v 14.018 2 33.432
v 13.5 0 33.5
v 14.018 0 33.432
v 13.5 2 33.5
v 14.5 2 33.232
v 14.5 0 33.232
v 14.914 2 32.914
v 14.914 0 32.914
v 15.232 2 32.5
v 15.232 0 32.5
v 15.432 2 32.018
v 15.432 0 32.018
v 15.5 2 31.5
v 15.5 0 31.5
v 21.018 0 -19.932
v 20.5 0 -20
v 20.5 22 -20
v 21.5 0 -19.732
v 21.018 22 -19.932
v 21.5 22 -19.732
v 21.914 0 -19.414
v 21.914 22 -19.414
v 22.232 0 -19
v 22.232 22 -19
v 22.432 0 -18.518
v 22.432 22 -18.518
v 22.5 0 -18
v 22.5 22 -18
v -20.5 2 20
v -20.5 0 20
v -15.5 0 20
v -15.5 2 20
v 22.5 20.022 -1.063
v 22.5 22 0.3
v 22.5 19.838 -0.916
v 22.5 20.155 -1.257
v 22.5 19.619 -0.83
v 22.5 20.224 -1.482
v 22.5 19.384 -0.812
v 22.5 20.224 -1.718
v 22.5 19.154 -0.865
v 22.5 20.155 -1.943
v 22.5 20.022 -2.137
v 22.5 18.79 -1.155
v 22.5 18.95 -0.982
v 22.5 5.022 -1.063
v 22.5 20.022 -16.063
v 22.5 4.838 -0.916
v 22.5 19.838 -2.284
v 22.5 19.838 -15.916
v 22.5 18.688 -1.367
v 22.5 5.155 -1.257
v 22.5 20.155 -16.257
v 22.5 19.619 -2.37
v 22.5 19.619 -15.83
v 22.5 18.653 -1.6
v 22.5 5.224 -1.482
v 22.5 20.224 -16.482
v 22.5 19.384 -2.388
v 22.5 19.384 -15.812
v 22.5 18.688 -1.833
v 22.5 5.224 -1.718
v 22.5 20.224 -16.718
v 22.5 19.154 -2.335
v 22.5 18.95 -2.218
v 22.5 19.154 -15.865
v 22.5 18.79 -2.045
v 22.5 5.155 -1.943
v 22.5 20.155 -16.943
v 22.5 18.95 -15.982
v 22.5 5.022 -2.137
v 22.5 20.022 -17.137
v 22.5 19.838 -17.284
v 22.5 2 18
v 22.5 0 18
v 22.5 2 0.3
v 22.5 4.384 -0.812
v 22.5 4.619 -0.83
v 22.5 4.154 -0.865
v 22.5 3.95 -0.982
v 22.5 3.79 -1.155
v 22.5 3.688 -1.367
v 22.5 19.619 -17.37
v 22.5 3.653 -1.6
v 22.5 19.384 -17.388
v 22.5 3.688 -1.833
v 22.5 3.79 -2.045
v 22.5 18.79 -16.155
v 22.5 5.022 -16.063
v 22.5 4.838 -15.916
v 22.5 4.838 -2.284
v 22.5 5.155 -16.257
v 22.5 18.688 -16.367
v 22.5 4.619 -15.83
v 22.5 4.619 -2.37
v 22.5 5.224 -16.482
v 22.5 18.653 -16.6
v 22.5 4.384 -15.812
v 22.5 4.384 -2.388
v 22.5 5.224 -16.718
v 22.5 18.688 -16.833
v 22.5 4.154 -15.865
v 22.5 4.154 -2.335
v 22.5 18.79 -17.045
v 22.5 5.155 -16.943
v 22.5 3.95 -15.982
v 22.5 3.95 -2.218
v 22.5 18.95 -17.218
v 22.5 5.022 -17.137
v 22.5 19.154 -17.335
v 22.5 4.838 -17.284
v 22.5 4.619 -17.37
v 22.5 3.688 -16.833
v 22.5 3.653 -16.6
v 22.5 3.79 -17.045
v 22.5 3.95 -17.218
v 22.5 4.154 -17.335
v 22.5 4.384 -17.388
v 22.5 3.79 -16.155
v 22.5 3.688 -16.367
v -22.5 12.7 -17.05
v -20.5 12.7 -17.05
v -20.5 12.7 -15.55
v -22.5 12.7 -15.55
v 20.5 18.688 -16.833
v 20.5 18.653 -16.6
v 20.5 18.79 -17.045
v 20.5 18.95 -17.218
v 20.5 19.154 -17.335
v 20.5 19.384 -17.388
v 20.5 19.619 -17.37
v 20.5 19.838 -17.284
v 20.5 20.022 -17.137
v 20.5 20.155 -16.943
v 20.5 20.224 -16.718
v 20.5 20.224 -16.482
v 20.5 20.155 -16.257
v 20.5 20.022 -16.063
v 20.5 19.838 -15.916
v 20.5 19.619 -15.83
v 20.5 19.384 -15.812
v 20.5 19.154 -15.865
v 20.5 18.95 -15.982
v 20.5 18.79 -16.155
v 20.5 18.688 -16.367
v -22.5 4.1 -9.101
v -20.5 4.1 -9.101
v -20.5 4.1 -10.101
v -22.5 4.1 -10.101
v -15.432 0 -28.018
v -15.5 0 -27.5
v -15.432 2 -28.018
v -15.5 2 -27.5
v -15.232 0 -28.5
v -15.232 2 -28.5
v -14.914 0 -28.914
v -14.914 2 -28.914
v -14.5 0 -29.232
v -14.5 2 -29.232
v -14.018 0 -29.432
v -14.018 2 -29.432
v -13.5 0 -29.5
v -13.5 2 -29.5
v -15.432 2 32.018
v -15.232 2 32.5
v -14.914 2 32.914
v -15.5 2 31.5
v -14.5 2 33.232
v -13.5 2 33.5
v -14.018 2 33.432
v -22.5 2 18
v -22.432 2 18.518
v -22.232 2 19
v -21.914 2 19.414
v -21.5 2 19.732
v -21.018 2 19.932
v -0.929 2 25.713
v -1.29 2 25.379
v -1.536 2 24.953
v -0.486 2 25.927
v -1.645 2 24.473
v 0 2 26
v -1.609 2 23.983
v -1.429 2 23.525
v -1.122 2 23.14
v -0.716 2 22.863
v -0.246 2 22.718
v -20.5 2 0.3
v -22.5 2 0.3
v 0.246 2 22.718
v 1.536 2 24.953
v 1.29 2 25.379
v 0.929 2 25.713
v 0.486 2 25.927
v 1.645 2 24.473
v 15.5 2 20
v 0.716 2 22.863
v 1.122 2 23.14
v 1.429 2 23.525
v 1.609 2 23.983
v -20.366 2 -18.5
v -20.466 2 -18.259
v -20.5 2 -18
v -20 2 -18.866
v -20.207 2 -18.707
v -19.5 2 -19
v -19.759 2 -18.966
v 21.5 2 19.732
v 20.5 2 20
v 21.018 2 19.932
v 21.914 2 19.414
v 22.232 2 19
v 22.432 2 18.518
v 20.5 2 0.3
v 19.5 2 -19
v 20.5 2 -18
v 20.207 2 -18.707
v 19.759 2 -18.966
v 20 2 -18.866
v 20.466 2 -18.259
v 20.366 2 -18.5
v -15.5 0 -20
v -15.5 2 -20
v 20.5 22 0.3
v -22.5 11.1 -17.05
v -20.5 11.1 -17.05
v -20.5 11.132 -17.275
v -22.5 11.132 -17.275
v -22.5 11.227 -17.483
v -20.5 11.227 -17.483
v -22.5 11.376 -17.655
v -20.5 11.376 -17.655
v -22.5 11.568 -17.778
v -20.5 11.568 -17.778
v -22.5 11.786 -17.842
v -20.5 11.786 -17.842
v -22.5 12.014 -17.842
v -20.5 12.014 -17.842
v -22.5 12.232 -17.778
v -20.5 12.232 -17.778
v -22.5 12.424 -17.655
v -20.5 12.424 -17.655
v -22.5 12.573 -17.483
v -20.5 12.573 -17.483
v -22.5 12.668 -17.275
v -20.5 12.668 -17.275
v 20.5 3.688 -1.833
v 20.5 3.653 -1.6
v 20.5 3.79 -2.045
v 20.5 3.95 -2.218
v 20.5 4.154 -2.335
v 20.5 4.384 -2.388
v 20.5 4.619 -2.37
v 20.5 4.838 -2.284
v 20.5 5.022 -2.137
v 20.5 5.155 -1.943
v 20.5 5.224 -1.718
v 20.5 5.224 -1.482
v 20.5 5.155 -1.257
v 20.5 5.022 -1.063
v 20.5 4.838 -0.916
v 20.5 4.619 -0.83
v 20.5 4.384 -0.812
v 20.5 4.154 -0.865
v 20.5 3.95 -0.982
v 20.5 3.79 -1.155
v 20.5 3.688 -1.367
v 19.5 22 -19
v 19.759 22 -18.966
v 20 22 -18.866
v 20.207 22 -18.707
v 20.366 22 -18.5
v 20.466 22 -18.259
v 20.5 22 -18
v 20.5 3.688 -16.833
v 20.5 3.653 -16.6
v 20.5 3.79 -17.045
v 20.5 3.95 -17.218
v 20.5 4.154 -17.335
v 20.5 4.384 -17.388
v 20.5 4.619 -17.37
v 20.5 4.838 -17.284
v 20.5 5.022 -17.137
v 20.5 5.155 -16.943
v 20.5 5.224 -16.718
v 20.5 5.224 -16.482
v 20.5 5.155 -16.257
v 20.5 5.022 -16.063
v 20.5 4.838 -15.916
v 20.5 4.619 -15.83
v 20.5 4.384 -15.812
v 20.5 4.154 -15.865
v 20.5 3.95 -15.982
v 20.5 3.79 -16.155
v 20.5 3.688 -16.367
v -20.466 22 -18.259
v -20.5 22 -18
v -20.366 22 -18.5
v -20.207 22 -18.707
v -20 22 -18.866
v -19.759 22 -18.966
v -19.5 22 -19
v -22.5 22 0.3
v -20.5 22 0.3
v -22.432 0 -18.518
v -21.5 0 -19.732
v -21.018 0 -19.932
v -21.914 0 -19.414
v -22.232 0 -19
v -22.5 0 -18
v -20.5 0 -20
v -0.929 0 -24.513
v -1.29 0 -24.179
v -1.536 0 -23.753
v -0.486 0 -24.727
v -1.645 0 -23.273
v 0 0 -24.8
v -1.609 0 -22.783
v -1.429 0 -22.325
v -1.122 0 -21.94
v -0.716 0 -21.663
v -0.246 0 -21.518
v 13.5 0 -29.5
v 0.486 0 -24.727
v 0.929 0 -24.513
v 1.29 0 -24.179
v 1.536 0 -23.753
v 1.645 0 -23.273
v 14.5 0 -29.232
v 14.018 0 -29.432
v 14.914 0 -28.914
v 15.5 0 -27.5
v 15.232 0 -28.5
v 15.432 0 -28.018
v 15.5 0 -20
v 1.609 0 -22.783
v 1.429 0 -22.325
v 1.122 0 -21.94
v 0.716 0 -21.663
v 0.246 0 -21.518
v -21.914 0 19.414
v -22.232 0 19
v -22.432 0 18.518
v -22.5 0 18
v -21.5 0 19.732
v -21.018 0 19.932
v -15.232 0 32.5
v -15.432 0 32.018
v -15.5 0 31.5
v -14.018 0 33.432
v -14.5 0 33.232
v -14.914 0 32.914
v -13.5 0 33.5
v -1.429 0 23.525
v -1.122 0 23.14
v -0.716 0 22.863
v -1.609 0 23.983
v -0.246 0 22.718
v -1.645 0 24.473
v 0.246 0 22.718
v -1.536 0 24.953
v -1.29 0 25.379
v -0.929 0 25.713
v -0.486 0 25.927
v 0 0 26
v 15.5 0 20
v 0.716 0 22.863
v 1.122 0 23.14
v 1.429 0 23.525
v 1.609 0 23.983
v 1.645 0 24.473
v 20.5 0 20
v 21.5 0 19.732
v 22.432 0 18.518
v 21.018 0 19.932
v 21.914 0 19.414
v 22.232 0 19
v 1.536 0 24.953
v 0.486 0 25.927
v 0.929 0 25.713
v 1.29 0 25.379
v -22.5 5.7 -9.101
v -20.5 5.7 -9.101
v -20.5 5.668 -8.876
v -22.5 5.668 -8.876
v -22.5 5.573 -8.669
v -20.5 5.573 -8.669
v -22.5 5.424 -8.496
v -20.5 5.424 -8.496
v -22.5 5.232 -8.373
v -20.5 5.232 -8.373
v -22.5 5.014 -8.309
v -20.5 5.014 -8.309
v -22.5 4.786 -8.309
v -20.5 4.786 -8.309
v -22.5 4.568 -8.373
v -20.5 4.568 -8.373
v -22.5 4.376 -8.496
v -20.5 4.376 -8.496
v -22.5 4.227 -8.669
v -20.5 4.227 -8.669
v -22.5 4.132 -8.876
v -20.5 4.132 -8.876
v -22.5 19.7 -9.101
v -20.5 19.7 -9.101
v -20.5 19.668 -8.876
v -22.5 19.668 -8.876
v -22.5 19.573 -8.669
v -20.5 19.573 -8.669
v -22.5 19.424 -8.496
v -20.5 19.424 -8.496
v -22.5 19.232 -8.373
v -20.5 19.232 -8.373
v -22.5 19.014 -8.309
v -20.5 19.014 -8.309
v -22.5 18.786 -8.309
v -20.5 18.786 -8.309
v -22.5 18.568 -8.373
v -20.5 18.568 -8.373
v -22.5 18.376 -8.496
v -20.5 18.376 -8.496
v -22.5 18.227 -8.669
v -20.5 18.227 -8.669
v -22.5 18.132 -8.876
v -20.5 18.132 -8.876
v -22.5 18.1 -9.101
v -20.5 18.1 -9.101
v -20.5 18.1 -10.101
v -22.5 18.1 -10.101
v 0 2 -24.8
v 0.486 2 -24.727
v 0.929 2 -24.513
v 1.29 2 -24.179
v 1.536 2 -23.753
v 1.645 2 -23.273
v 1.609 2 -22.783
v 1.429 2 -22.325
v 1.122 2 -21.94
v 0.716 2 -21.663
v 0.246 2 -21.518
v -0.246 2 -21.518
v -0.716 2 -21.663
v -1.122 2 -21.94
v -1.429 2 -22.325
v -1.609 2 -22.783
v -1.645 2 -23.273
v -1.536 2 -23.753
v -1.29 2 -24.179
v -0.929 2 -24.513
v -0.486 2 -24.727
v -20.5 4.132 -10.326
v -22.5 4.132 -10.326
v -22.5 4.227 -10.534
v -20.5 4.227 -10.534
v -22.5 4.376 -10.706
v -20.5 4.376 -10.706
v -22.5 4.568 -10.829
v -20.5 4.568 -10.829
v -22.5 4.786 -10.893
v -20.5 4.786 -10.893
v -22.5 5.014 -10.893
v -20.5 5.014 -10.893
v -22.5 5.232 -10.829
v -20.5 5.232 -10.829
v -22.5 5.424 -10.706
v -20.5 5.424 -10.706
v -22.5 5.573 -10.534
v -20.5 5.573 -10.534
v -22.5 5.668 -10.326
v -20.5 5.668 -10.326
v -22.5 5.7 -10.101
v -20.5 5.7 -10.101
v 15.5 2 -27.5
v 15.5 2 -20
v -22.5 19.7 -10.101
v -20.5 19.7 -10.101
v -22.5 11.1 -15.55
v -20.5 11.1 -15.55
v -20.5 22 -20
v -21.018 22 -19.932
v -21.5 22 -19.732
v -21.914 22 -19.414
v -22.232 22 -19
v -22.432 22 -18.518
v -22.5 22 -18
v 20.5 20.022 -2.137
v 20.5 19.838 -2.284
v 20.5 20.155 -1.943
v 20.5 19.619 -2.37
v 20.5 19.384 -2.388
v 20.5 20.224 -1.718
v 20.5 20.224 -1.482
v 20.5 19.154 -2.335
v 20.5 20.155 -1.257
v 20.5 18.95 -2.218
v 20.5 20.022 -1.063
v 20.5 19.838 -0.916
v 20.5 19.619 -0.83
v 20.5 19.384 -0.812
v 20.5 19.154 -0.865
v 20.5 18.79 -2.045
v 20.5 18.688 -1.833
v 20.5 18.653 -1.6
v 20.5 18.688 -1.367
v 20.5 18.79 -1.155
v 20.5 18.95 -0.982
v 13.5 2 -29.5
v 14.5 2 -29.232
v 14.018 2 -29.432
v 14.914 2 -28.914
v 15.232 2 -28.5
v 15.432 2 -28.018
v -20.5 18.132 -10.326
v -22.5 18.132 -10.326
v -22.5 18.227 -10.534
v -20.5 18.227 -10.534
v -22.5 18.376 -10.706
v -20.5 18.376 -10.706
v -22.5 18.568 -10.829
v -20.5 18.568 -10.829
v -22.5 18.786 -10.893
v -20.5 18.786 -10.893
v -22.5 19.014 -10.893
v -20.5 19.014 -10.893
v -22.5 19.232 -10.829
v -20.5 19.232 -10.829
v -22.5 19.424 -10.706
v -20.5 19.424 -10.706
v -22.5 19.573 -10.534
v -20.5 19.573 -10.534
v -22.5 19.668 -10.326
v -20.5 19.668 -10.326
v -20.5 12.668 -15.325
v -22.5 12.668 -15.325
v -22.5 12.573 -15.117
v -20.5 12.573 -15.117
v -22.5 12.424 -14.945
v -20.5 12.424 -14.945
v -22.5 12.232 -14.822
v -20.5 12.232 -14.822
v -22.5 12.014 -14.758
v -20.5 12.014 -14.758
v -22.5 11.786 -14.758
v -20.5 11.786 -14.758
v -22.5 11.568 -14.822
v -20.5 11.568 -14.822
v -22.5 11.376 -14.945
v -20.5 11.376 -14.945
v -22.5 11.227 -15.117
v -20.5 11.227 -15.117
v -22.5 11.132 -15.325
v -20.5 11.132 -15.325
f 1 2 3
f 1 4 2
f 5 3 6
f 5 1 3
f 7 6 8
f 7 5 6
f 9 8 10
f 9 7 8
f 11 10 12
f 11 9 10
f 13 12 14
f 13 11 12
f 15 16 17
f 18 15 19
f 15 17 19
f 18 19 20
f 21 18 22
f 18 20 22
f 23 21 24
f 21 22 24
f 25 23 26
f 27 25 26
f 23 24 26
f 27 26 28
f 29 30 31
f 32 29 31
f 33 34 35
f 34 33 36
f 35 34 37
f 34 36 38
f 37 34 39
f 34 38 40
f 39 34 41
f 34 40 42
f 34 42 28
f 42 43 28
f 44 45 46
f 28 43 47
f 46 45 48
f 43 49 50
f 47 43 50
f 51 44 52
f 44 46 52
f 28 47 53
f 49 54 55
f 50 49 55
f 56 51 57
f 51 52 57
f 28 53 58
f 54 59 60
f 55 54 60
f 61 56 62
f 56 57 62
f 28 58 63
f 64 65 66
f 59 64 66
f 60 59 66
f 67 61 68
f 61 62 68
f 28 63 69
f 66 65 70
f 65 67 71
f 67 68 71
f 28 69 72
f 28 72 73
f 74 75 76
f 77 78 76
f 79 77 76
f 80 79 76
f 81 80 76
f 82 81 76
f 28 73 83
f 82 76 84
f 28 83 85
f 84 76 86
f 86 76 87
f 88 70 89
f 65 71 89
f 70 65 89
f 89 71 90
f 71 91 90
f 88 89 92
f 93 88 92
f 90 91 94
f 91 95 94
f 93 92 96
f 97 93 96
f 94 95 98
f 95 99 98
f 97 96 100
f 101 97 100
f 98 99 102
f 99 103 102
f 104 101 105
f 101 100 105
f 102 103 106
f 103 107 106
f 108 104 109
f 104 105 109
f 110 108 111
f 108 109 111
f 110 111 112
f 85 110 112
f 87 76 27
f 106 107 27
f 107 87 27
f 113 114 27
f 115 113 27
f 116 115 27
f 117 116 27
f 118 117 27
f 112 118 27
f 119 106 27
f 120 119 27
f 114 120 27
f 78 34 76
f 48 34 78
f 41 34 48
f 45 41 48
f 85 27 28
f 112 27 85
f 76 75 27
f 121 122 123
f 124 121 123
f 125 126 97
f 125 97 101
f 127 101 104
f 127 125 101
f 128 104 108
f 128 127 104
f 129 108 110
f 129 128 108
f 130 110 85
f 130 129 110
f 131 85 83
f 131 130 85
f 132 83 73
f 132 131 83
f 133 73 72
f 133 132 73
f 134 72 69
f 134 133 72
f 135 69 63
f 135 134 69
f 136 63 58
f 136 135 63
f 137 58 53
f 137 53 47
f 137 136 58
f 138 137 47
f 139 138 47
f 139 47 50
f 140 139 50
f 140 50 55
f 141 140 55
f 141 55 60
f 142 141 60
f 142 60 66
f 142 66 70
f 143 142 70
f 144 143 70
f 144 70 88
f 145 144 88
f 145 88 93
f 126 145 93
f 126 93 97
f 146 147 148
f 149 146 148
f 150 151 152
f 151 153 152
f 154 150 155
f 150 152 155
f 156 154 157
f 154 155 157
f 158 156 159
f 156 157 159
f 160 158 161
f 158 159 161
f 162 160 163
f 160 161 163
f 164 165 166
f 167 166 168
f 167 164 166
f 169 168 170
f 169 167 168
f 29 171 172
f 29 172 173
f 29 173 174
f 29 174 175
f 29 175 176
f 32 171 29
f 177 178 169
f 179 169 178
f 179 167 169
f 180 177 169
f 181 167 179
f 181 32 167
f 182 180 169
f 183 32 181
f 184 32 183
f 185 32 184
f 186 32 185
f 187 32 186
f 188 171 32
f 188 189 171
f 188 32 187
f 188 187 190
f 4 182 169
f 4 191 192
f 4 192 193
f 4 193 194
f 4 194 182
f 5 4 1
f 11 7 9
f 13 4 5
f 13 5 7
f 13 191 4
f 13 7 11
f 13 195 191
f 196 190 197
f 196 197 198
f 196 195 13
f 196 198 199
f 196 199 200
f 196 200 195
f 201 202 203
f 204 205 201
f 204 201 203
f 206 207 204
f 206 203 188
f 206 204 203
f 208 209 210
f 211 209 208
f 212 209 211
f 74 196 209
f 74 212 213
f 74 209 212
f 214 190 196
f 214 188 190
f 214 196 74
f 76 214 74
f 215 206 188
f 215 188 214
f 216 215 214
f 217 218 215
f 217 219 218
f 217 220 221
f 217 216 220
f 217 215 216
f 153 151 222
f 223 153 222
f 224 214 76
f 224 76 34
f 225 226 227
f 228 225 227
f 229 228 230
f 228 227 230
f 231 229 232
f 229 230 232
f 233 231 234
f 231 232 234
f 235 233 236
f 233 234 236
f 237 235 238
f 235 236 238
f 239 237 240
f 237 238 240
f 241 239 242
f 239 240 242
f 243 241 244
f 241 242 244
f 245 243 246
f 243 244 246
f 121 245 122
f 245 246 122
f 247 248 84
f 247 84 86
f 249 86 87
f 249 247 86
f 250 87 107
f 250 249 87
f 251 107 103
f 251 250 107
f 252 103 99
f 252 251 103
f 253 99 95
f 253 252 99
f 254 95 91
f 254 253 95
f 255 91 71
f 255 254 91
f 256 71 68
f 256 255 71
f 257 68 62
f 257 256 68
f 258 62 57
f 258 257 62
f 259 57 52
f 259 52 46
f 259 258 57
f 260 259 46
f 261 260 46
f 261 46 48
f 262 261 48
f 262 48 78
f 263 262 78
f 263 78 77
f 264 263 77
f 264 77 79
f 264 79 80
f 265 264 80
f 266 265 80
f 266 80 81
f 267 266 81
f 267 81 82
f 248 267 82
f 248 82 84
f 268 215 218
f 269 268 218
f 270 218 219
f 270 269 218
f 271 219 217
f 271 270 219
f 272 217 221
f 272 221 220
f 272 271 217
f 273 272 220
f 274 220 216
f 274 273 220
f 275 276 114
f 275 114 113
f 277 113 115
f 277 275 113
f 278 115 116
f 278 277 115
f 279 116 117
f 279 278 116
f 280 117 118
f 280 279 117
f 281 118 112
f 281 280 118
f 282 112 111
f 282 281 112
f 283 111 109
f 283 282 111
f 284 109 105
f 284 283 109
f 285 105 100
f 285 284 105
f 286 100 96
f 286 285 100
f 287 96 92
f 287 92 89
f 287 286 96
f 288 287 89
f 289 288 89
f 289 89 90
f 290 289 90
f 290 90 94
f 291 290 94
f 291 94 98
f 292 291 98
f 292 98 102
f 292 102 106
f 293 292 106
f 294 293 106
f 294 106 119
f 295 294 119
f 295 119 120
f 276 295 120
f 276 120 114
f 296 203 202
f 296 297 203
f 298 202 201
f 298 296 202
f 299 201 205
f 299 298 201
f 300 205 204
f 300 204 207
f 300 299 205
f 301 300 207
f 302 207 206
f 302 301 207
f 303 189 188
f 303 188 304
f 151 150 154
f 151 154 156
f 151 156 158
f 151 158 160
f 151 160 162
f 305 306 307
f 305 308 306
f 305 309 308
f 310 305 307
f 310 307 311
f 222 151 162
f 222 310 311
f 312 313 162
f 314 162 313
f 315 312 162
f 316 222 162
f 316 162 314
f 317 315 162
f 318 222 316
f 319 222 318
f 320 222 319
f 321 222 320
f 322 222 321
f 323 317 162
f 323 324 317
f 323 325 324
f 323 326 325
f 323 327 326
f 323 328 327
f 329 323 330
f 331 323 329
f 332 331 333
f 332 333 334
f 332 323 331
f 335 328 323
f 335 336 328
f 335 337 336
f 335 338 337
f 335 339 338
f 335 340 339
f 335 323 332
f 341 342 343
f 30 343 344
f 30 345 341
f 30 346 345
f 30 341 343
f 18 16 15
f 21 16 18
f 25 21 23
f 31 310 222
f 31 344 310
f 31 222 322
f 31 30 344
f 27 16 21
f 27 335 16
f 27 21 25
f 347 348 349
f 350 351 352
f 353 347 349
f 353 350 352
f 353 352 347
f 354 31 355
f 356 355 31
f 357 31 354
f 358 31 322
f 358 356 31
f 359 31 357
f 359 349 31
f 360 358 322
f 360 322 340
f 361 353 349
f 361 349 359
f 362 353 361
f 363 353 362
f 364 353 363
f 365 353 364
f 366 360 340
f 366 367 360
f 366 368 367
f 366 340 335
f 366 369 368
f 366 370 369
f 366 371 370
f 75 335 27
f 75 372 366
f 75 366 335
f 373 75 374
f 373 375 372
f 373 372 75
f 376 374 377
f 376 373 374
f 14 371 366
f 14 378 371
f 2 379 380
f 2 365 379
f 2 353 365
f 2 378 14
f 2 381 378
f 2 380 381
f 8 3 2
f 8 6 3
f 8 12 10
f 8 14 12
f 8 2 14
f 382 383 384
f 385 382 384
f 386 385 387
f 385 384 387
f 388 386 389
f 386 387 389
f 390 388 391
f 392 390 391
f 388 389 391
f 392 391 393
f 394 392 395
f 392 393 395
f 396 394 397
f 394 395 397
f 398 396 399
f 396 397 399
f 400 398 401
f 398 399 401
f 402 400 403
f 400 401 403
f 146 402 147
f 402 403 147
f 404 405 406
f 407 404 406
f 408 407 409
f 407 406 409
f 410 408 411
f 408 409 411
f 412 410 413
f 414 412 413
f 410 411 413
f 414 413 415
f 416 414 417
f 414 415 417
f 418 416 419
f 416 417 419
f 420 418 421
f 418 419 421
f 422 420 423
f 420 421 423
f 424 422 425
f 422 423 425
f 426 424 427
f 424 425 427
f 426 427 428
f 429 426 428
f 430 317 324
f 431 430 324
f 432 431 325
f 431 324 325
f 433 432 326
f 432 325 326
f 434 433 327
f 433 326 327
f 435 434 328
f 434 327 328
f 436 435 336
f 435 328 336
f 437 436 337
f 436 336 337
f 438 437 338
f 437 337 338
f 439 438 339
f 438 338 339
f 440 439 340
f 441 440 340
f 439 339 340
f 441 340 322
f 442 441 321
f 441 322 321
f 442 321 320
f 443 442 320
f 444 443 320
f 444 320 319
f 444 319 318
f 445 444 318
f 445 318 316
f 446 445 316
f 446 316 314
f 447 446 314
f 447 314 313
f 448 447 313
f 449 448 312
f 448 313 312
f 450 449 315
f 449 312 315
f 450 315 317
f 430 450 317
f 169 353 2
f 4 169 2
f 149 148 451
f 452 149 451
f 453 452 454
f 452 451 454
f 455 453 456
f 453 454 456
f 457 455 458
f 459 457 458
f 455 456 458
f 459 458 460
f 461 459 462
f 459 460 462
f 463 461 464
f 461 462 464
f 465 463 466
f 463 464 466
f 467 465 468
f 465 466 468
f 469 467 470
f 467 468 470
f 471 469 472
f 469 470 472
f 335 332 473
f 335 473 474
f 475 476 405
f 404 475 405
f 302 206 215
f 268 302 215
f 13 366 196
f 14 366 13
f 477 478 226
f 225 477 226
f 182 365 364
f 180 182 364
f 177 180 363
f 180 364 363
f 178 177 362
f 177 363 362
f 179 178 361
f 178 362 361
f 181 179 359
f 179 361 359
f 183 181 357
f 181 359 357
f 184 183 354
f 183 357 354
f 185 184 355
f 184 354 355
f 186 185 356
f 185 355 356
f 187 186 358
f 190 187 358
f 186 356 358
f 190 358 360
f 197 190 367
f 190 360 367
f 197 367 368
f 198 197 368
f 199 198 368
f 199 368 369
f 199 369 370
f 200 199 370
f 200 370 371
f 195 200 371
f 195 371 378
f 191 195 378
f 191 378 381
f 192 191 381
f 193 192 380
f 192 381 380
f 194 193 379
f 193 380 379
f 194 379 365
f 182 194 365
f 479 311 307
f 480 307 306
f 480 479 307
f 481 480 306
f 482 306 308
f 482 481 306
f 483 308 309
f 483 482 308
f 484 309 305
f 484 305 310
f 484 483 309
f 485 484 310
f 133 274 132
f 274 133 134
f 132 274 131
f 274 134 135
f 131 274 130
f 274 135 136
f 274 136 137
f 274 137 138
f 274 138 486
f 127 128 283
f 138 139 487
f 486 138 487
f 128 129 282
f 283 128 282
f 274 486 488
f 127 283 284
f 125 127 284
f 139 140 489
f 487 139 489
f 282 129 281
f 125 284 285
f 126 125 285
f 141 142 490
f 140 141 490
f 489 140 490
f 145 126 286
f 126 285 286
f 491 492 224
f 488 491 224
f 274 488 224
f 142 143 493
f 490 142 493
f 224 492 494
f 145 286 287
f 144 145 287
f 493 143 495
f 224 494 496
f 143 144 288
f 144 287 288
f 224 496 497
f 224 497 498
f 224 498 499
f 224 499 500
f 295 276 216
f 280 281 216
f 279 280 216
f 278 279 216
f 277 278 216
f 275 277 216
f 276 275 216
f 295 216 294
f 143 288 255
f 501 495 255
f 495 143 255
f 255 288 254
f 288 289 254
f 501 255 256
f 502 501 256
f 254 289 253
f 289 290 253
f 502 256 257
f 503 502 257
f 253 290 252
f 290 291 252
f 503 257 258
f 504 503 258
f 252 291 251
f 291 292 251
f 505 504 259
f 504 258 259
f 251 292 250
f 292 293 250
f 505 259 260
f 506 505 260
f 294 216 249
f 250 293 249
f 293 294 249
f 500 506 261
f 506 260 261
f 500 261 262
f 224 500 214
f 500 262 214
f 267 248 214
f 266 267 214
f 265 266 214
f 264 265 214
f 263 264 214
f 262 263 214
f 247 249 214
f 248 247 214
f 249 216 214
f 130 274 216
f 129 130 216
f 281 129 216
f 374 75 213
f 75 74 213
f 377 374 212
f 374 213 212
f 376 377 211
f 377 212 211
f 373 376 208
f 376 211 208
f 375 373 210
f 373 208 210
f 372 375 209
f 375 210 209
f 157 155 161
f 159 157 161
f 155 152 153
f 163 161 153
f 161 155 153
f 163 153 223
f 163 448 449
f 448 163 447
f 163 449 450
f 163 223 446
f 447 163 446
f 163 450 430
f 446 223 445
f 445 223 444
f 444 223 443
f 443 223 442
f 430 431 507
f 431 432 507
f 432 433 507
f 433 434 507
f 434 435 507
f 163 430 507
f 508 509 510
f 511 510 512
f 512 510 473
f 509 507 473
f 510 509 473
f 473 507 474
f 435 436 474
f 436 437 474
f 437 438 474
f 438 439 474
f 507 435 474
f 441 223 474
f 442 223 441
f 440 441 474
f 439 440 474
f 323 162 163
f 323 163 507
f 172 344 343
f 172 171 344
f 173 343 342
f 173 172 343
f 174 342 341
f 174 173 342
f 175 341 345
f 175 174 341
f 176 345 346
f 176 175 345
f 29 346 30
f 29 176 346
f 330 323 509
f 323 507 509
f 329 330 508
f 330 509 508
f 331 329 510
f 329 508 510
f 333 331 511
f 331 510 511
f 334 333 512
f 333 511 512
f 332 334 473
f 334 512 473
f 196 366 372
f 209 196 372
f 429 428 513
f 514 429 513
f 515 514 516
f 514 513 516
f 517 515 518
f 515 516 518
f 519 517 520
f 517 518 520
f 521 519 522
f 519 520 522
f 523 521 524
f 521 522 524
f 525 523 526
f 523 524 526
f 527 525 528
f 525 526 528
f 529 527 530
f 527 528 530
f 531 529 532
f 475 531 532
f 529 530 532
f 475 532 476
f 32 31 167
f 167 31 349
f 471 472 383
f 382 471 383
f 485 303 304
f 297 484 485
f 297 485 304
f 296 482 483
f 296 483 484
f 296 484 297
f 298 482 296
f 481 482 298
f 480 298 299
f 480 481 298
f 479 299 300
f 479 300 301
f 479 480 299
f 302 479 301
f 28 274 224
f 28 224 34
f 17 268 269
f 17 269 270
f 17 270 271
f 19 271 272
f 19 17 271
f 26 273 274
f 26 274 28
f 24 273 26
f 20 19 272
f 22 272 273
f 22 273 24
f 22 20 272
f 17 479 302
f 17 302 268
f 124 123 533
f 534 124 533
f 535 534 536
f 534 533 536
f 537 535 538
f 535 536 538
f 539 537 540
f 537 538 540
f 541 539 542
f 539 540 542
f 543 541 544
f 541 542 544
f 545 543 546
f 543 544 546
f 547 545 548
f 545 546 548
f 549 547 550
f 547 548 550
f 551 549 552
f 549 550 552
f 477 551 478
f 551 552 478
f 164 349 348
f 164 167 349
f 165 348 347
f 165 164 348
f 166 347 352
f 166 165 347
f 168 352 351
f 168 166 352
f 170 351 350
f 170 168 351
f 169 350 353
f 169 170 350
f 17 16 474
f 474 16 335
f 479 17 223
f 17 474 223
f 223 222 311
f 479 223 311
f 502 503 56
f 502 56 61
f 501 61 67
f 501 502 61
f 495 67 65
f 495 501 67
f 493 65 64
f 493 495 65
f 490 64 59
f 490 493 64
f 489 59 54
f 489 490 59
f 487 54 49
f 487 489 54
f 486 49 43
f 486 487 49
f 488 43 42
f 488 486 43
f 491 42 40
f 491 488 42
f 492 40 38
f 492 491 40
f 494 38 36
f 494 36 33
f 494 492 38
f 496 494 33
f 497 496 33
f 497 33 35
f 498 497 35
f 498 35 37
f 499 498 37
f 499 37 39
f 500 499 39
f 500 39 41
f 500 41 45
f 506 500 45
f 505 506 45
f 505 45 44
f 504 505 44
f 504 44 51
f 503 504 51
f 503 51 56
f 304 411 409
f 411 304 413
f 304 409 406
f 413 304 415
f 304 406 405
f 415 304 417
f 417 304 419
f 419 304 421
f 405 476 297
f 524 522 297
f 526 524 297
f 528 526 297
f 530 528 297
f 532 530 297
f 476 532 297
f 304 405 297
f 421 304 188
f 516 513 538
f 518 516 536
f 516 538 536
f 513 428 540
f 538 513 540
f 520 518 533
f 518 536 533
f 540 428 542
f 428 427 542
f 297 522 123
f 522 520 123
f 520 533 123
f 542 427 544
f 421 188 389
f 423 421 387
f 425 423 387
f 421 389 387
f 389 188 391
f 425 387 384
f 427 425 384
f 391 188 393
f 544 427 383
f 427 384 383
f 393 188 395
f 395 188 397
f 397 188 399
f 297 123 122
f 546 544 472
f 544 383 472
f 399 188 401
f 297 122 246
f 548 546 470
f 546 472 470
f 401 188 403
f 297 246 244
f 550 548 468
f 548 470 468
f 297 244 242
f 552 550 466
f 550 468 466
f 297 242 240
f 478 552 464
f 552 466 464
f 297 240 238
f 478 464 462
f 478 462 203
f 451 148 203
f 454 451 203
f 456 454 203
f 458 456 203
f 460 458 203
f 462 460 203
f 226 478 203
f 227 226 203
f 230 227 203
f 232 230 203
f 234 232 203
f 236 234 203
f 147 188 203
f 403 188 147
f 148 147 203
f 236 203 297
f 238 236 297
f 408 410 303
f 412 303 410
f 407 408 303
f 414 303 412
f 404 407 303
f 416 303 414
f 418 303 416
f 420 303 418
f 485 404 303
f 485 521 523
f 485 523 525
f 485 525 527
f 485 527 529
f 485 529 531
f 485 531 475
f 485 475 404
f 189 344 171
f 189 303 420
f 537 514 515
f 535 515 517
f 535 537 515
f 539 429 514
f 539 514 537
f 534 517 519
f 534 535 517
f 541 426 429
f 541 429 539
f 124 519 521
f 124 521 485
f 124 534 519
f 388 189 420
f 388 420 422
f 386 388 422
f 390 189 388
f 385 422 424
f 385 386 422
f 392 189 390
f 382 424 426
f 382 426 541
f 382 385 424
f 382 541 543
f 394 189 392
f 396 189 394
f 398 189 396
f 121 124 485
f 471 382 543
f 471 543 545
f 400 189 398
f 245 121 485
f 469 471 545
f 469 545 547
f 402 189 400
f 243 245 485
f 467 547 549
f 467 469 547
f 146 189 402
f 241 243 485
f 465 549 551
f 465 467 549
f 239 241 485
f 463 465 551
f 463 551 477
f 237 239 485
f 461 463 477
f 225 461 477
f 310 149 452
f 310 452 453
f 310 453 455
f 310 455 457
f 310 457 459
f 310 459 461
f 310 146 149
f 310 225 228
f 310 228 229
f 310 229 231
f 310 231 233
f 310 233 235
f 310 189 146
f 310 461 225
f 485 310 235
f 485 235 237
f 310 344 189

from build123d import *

# Parameters (mm, degrees)
SKETCH_1_W          = 45
SKETCH_1_H          = 40
EXTRUDE_1_DEPTH     = 2
EXTRUDE_2_DEPTH     = 20
SKETCH_3_W          = 31
SKETCH_3_H          = 63
EXTRUDE_3_DEPTH     = 2
SKETCH_4_R          = 1.65
CUT_EXTRUDE_1_DEPTH = 2
FILLET_2_R          = 2
EXTRUDE_4_DEPTH     = 20
CUT_EXTRUDE_2_DEPTH = 2.5
CUT_EXTRUDE_5_REACH = 62.26
SKETCH_11_W         = 2
SKETCH_11_H         = 20
FILLET_5_R          = 1
CUT_EXTRUDE_6_DEPTH = 2.5


with BuildPart() as part:
    # 草图1 → 凸台-拉伸1 (new body)
    with BuildSketch(Plane(origin=(0, 0, 0), x_dir=(1, 0, 0), z_dir=(0, 1, 0))):
        Rectangle(SKETCH_1_W, SKETCH_1_H)
    extrude(amount=EXTRUDE_1_DEPTH)

    # 草图2 → 凸台-拉伸2 (add)
    with BuildSketch(Plane(origin=(0, 2, 0), x_dir=(1, 0, 0), z_dir=(0, 1, 0))):
        Polygon((21.5, -2.3), (22.5, -2.3), (22.5, 20), (-22.5, 20), (-22.5, -2.3), (-21.5, -2.3), (-21.5, 19), (21.5, 19), align=None)
    extrude(amount=EXTRUDE_2_DEPTH)

    # 草图3 → 凸台-拉伸3 (add)
    with BuildSketch(Plane.XZ):
        with Locations((0, 2)):
            Rectangle(SKETCH_3_W, SKETCH_3_H)
    extrude(amount=-EXTRUDE_3_DEPTH)

    # 草图4 → 切除-拉伸1 (cut)
    with BuildSketch(Plane.XZ):
        with Locations(Location((0, -23.15, 0), (0, 0, 270))):
            Circle(SKETCH_4_R)
        with Locations(Location((0, 24.35, 0), (0, 0, 90))):
            Circle(SKETCH_4_R)
    extrude(amount=-CUT_EXTRUDE_1_DEPTH, mode=Mode.SUBTRACT)

    # 圆角2
    fillet_2_edges = [part.edges().sort_by_distance(p)[0] for p in [
        (-15.5, 1, -29.5),
        (15.5, 1, 33.5),
        (-15.5, 1, 33.5),
        (15.5, 1, -29.5),
        (22.5, 1, 20),
        (-22.5, 1, 20),
        (-22.5, 11, -20),
        (22.5, 11, -20),
    ]]
    fillet(fillet_2_edges, radius=FILLET_2_R)

    # 草图7 → 凸台-拉伸4 (add)
    with BuildSketch(Plane(origin=(0, 2, 0), x_dir=(1, 0, 0), z_dir=(0, 1, 0))):
        Polygon((20.5, 18), (20.5, -2.3), (21.5, -2.3), (21.5, 19), (20.5, 19), align=None)
        Polygon((-21.5, 19), (-21.5, -2.3), (-20.5, -2.3), (-20.5, 18), (-20.5, 19), align=None)
    extrude(amount=EXTRUDE_4_DEPTH)

    # 草图8 → 切除-拉伸2 (cut)
    with BuildSketch(Plane(origin=(20, 1.9, 0.9), x_dir=(0, 1, 0), z_dir=(1, 0, 0))):
        with BuildLine():
            ThreePointArc((18.33276934, -17.5), (17.54276934, -16.71), (16.75276934, -17.5))
            ThreePointArc((16.75276934, -17.5), (17.54276934, -18.29), (18.33276934, -17.5))
        make_face()
        with BuildLine():
            ThreePointArc((3.33276934, -17.5), (2.54276934, -16.71), (1.75276934, -17.5))
            ThreePointArc((1.75276934, -17.5), (2.54276934, -18.29), (3.33276934, -17.5))
        make_face()
        with BuildLine():
            ThreePointArc((3.33276934, -2.5), (2.54276934, -1.71), (1.75276934, -2.5))
            ThreePointArc((1.75276934, -2.5), (2.54276934, -3.29), (3.33276934, -2.5))
        make_face()
        with BuildLine():
            ThreePointArc((18.33276934, -2.5), (17.54276934, -1.71), (16.75276934, -2.5))
            ThreePointArc((16.75276934, -2.5), (17.54276934, -3.29), (18.33276934, -2.5))
        make_face()
    extrude(amount=CUT_EXTRUDE_2_DEPTH, mode=Mode.SUBTRACT)

    # 切除-拉伸5: up to this face of the body (flat: up to its plane)
    cut_extrude_5_end = Plane(part.part.faces().sort_by_distance((22.5, 10.316412164, -6.626998027))[0])
    # 草图11 → 切除-拉伸5 (cut, up to the picked face)
    with BuildSketch(Plane.ZY.offset(22.5), mode=Mode.PRIVATE) as cut_extrude_5_sk1:
        with Locations((1.3, 12)):
            Rectangle(SKETCH_11_W, SKETCH_11_H)
    cut_extrude_5_tool1 = split(extrude(cut_extrude_5_sk1.sketch, amount=-CUT_EXTRUDE_5_REACH, mode=Mode.PRIVATE), bisect_by=cut_extrude_5_end, keep=Keep.BOTH, mode=Mode.PRIVATE)
    add(cut_extrude_5_tool1.solids().sort_by(Axis((-22.5, 12, 1.3), (1, 0, 0)))[0], mode=Mode.SUBTRACT)

    # 圆角5
    fillet_5_edges = [part.edges().sort_by_distance(p)[0] for p in [
        (20.5, 12, -19),
        (-20.5, 12, -19),
    ]]
    fillet(fillet_5_edges, radius=FILLET_5_R)

    # 草图12 → 切除-拉伸6 (cut)
    with BuildSketch(Plane(origin=(-20, 1.9, 0.9), x_dir=(0, -1, 0), z_dir=(-1, 0, 0))):
        with BuildLine():
            Line((-10.8, -17.95), (-10.8, -16.45))
            ThreePointArc((-10.8, -16.45), (-10, -15.65), (-9.2, -16.45))
            Line((-9.2, -16.45), (-9.2, -17.95))
            ThreePointArc((-9.2, -17.95), (-10, -18.75), (-10.8, -17.95))
        make_face()
        with BuildLine():
            Line((-3.8, -11.0010906), (-3.8, -10.0010906))
            ThreePointArc((-3.8, -10.0010906), (-3, -9.2010906), (-2.2, -10.0010906))
            Line((-2.2, -10.0010906), (-2.2, -11.0010906))
            ThreePointArc((-2.2, -11.0010906), (-3, -11.8010906), (-3.8, -11.0010906))
        make_face()
        with BuildLine():
            Line((-17.8, -11.0010906), (-17.8, -10.0010906))
            ThreePointArc((-17.8, -10.0010906), (-17, -9.2010906), (-16.2, -10.0010906))
            Line((-16.2, -10.0010906), (-16.2, -11.0010906))
            ThreePointArc((-16.2, -11.0010906), (-17, -11.8010906), (-17.8, -11.0010906))
        make_face()
    extrude(amount=CUT_EXTRUDE_6_DEPTH, mode=Mode.SUBTRACT)


solid = part.part
